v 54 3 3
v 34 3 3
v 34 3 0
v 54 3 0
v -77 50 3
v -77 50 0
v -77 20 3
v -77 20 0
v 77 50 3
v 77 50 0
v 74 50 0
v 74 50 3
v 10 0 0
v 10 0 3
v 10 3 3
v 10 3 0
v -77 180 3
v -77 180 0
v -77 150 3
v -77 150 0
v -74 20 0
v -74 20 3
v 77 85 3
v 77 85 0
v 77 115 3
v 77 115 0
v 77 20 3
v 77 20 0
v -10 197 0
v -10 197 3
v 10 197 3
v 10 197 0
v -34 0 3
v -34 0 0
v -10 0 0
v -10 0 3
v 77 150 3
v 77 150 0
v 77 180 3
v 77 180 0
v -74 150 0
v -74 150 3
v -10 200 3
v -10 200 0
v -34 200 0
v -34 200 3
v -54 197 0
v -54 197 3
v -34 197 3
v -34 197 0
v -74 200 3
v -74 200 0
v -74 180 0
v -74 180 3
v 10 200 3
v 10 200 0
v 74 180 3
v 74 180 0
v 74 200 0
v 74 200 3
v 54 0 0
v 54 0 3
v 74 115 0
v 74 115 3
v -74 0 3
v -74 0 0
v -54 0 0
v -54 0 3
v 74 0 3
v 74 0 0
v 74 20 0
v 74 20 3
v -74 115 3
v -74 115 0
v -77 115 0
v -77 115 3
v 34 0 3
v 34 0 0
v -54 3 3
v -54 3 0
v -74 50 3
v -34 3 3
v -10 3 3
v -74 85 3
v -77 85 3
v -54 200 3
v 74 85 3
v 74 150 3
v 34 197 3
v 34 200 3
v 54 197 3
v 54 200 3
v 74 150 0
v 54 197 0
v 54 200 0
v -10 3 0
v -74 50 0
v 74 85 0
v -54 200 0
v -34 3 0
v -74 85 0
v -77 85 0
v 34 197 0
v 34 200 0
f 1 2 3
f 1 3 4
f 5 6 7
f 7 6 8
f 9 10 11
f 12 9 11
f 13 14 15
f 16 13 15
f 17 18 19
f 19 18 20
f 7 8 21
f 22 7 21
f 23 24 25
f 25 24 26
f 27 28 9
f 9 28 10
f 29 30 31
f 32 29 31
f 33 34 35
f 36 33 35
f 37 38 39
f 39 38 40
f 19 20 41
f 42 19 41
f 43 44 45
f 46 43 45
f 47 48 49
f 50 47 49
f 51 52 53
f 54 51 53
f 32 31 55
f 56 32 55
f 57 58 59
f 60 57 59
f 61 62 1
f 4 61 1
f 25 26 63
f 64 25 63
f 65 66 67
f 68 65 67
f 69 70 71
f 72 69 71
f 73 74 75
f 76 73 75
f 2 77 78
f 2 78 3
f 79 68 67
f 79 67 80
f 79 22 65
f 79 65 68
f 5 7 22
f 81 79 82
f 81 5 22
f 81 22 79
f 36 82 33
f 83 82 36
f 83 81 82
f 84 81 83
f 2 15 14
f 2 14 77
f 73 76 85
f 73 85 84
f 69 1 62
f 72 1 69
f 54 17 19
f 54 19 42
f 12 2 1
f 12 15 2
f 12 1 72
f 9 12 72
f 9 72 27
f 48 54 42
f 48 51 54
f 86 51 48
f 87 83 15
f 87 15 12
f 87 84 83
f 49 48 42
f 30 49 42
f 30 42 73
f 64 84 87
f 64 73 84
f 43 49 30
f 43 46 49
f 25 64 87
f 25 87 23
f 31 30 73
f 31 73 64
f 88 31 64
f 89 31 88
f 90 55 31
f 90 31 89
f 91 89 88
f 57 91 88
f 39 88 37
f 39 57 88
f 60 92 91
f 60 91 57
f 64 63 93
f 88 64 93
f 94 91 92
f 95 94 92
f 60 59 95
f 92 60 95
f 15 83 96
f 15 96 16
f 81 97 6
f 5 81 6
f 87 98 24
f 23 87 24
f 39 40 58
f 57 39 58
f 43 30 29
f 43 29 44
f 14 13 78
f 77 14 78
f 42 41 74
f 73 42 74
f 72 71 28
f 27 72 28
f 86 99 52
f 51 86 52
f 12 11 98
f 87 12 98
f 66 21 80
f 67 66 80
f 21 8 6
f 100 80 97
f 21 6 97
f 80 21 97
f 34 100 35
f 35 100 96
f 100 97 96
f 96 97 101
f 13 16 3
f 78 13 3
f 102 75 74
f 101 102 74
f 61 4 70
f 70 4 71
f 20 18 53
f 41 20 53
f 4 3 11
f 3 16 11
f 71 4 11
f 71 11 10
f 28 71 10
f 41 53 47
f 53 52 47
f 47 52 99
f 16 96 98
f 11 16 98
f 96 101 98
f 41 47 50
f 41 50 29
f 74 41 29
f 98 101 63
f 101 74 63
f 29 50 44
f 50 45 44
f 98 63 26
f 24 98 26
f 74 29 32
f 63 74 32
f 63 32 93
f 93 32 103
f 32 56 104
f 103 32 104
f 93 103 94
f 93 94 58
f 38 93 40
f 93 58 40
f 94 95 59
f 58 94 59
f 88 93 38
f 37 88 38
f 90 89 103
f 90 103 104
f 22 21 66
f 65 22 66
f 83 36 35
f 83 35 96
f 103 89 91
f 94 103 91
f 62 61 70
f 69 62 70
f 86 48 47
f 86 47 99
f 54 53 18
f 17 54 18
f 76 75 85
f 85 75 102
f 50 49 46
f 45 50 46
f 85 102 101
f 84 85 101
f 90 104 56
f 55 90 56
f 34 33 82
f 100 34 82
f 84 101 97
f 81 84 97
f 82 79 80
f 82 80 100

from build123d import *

# Parameters (mm, degrees)
F1_DEPTH = 3
F2_W     = 20
F2_H     = 3
F3_DEPTH = 3.001


# Not quite as in the source:
# - a feature names something its author has since deleted; it is built from what else it names


with BuildPart() as f1:
    # F0 (on Top) → F1 (new body)
    with BuildSketch(Plane.XY):
        Polygon((-74, 0), (0, 0), (74, 0), (74, 20), (77, 20), (77, 50), (74, 50), (74, 85), (77, 85), (77, 115), (74, 115), (74, 150), (77, 150), (77, 180), (74, 180), (74, 200), (0, 200), (-74, 200), (-74, 180), (-77, 180), (-77, 150), (-74, 150), (-74, 115), (-77, 115), (-77, 85), (-74, 85), (-74, 50), (-77, 50), (-77, 20), (-74, 20), align=None)
    extrude(amount=F1_DEPTH)

    # F2 (on face) → F3 (cut, through all)
    with BuildSketch(Plane.XY.offset(3)):
        with Locations((-44, 1.5)):
            Rectangle(F2_W, F2_H)
        with Locations((44, 1.5)):
            Rectangle(F2_W, F2_H)
        with Locations((0, 1.5)):
            Rectangle(F2_W, F2_H)
        with Locations((-44, 198.5)):
            Rectangle(F2_W, F2_H)
        with Locations((44, 198.5)):
            Rectangle(F2_W, F2_H)
        with Locations((0, 198.5)):
            Rectangle(F2_W, F2_H)
    extrude(amount=-F3_DEPTH, mode=Mode.SUBTRACT)


solid = f1.part
